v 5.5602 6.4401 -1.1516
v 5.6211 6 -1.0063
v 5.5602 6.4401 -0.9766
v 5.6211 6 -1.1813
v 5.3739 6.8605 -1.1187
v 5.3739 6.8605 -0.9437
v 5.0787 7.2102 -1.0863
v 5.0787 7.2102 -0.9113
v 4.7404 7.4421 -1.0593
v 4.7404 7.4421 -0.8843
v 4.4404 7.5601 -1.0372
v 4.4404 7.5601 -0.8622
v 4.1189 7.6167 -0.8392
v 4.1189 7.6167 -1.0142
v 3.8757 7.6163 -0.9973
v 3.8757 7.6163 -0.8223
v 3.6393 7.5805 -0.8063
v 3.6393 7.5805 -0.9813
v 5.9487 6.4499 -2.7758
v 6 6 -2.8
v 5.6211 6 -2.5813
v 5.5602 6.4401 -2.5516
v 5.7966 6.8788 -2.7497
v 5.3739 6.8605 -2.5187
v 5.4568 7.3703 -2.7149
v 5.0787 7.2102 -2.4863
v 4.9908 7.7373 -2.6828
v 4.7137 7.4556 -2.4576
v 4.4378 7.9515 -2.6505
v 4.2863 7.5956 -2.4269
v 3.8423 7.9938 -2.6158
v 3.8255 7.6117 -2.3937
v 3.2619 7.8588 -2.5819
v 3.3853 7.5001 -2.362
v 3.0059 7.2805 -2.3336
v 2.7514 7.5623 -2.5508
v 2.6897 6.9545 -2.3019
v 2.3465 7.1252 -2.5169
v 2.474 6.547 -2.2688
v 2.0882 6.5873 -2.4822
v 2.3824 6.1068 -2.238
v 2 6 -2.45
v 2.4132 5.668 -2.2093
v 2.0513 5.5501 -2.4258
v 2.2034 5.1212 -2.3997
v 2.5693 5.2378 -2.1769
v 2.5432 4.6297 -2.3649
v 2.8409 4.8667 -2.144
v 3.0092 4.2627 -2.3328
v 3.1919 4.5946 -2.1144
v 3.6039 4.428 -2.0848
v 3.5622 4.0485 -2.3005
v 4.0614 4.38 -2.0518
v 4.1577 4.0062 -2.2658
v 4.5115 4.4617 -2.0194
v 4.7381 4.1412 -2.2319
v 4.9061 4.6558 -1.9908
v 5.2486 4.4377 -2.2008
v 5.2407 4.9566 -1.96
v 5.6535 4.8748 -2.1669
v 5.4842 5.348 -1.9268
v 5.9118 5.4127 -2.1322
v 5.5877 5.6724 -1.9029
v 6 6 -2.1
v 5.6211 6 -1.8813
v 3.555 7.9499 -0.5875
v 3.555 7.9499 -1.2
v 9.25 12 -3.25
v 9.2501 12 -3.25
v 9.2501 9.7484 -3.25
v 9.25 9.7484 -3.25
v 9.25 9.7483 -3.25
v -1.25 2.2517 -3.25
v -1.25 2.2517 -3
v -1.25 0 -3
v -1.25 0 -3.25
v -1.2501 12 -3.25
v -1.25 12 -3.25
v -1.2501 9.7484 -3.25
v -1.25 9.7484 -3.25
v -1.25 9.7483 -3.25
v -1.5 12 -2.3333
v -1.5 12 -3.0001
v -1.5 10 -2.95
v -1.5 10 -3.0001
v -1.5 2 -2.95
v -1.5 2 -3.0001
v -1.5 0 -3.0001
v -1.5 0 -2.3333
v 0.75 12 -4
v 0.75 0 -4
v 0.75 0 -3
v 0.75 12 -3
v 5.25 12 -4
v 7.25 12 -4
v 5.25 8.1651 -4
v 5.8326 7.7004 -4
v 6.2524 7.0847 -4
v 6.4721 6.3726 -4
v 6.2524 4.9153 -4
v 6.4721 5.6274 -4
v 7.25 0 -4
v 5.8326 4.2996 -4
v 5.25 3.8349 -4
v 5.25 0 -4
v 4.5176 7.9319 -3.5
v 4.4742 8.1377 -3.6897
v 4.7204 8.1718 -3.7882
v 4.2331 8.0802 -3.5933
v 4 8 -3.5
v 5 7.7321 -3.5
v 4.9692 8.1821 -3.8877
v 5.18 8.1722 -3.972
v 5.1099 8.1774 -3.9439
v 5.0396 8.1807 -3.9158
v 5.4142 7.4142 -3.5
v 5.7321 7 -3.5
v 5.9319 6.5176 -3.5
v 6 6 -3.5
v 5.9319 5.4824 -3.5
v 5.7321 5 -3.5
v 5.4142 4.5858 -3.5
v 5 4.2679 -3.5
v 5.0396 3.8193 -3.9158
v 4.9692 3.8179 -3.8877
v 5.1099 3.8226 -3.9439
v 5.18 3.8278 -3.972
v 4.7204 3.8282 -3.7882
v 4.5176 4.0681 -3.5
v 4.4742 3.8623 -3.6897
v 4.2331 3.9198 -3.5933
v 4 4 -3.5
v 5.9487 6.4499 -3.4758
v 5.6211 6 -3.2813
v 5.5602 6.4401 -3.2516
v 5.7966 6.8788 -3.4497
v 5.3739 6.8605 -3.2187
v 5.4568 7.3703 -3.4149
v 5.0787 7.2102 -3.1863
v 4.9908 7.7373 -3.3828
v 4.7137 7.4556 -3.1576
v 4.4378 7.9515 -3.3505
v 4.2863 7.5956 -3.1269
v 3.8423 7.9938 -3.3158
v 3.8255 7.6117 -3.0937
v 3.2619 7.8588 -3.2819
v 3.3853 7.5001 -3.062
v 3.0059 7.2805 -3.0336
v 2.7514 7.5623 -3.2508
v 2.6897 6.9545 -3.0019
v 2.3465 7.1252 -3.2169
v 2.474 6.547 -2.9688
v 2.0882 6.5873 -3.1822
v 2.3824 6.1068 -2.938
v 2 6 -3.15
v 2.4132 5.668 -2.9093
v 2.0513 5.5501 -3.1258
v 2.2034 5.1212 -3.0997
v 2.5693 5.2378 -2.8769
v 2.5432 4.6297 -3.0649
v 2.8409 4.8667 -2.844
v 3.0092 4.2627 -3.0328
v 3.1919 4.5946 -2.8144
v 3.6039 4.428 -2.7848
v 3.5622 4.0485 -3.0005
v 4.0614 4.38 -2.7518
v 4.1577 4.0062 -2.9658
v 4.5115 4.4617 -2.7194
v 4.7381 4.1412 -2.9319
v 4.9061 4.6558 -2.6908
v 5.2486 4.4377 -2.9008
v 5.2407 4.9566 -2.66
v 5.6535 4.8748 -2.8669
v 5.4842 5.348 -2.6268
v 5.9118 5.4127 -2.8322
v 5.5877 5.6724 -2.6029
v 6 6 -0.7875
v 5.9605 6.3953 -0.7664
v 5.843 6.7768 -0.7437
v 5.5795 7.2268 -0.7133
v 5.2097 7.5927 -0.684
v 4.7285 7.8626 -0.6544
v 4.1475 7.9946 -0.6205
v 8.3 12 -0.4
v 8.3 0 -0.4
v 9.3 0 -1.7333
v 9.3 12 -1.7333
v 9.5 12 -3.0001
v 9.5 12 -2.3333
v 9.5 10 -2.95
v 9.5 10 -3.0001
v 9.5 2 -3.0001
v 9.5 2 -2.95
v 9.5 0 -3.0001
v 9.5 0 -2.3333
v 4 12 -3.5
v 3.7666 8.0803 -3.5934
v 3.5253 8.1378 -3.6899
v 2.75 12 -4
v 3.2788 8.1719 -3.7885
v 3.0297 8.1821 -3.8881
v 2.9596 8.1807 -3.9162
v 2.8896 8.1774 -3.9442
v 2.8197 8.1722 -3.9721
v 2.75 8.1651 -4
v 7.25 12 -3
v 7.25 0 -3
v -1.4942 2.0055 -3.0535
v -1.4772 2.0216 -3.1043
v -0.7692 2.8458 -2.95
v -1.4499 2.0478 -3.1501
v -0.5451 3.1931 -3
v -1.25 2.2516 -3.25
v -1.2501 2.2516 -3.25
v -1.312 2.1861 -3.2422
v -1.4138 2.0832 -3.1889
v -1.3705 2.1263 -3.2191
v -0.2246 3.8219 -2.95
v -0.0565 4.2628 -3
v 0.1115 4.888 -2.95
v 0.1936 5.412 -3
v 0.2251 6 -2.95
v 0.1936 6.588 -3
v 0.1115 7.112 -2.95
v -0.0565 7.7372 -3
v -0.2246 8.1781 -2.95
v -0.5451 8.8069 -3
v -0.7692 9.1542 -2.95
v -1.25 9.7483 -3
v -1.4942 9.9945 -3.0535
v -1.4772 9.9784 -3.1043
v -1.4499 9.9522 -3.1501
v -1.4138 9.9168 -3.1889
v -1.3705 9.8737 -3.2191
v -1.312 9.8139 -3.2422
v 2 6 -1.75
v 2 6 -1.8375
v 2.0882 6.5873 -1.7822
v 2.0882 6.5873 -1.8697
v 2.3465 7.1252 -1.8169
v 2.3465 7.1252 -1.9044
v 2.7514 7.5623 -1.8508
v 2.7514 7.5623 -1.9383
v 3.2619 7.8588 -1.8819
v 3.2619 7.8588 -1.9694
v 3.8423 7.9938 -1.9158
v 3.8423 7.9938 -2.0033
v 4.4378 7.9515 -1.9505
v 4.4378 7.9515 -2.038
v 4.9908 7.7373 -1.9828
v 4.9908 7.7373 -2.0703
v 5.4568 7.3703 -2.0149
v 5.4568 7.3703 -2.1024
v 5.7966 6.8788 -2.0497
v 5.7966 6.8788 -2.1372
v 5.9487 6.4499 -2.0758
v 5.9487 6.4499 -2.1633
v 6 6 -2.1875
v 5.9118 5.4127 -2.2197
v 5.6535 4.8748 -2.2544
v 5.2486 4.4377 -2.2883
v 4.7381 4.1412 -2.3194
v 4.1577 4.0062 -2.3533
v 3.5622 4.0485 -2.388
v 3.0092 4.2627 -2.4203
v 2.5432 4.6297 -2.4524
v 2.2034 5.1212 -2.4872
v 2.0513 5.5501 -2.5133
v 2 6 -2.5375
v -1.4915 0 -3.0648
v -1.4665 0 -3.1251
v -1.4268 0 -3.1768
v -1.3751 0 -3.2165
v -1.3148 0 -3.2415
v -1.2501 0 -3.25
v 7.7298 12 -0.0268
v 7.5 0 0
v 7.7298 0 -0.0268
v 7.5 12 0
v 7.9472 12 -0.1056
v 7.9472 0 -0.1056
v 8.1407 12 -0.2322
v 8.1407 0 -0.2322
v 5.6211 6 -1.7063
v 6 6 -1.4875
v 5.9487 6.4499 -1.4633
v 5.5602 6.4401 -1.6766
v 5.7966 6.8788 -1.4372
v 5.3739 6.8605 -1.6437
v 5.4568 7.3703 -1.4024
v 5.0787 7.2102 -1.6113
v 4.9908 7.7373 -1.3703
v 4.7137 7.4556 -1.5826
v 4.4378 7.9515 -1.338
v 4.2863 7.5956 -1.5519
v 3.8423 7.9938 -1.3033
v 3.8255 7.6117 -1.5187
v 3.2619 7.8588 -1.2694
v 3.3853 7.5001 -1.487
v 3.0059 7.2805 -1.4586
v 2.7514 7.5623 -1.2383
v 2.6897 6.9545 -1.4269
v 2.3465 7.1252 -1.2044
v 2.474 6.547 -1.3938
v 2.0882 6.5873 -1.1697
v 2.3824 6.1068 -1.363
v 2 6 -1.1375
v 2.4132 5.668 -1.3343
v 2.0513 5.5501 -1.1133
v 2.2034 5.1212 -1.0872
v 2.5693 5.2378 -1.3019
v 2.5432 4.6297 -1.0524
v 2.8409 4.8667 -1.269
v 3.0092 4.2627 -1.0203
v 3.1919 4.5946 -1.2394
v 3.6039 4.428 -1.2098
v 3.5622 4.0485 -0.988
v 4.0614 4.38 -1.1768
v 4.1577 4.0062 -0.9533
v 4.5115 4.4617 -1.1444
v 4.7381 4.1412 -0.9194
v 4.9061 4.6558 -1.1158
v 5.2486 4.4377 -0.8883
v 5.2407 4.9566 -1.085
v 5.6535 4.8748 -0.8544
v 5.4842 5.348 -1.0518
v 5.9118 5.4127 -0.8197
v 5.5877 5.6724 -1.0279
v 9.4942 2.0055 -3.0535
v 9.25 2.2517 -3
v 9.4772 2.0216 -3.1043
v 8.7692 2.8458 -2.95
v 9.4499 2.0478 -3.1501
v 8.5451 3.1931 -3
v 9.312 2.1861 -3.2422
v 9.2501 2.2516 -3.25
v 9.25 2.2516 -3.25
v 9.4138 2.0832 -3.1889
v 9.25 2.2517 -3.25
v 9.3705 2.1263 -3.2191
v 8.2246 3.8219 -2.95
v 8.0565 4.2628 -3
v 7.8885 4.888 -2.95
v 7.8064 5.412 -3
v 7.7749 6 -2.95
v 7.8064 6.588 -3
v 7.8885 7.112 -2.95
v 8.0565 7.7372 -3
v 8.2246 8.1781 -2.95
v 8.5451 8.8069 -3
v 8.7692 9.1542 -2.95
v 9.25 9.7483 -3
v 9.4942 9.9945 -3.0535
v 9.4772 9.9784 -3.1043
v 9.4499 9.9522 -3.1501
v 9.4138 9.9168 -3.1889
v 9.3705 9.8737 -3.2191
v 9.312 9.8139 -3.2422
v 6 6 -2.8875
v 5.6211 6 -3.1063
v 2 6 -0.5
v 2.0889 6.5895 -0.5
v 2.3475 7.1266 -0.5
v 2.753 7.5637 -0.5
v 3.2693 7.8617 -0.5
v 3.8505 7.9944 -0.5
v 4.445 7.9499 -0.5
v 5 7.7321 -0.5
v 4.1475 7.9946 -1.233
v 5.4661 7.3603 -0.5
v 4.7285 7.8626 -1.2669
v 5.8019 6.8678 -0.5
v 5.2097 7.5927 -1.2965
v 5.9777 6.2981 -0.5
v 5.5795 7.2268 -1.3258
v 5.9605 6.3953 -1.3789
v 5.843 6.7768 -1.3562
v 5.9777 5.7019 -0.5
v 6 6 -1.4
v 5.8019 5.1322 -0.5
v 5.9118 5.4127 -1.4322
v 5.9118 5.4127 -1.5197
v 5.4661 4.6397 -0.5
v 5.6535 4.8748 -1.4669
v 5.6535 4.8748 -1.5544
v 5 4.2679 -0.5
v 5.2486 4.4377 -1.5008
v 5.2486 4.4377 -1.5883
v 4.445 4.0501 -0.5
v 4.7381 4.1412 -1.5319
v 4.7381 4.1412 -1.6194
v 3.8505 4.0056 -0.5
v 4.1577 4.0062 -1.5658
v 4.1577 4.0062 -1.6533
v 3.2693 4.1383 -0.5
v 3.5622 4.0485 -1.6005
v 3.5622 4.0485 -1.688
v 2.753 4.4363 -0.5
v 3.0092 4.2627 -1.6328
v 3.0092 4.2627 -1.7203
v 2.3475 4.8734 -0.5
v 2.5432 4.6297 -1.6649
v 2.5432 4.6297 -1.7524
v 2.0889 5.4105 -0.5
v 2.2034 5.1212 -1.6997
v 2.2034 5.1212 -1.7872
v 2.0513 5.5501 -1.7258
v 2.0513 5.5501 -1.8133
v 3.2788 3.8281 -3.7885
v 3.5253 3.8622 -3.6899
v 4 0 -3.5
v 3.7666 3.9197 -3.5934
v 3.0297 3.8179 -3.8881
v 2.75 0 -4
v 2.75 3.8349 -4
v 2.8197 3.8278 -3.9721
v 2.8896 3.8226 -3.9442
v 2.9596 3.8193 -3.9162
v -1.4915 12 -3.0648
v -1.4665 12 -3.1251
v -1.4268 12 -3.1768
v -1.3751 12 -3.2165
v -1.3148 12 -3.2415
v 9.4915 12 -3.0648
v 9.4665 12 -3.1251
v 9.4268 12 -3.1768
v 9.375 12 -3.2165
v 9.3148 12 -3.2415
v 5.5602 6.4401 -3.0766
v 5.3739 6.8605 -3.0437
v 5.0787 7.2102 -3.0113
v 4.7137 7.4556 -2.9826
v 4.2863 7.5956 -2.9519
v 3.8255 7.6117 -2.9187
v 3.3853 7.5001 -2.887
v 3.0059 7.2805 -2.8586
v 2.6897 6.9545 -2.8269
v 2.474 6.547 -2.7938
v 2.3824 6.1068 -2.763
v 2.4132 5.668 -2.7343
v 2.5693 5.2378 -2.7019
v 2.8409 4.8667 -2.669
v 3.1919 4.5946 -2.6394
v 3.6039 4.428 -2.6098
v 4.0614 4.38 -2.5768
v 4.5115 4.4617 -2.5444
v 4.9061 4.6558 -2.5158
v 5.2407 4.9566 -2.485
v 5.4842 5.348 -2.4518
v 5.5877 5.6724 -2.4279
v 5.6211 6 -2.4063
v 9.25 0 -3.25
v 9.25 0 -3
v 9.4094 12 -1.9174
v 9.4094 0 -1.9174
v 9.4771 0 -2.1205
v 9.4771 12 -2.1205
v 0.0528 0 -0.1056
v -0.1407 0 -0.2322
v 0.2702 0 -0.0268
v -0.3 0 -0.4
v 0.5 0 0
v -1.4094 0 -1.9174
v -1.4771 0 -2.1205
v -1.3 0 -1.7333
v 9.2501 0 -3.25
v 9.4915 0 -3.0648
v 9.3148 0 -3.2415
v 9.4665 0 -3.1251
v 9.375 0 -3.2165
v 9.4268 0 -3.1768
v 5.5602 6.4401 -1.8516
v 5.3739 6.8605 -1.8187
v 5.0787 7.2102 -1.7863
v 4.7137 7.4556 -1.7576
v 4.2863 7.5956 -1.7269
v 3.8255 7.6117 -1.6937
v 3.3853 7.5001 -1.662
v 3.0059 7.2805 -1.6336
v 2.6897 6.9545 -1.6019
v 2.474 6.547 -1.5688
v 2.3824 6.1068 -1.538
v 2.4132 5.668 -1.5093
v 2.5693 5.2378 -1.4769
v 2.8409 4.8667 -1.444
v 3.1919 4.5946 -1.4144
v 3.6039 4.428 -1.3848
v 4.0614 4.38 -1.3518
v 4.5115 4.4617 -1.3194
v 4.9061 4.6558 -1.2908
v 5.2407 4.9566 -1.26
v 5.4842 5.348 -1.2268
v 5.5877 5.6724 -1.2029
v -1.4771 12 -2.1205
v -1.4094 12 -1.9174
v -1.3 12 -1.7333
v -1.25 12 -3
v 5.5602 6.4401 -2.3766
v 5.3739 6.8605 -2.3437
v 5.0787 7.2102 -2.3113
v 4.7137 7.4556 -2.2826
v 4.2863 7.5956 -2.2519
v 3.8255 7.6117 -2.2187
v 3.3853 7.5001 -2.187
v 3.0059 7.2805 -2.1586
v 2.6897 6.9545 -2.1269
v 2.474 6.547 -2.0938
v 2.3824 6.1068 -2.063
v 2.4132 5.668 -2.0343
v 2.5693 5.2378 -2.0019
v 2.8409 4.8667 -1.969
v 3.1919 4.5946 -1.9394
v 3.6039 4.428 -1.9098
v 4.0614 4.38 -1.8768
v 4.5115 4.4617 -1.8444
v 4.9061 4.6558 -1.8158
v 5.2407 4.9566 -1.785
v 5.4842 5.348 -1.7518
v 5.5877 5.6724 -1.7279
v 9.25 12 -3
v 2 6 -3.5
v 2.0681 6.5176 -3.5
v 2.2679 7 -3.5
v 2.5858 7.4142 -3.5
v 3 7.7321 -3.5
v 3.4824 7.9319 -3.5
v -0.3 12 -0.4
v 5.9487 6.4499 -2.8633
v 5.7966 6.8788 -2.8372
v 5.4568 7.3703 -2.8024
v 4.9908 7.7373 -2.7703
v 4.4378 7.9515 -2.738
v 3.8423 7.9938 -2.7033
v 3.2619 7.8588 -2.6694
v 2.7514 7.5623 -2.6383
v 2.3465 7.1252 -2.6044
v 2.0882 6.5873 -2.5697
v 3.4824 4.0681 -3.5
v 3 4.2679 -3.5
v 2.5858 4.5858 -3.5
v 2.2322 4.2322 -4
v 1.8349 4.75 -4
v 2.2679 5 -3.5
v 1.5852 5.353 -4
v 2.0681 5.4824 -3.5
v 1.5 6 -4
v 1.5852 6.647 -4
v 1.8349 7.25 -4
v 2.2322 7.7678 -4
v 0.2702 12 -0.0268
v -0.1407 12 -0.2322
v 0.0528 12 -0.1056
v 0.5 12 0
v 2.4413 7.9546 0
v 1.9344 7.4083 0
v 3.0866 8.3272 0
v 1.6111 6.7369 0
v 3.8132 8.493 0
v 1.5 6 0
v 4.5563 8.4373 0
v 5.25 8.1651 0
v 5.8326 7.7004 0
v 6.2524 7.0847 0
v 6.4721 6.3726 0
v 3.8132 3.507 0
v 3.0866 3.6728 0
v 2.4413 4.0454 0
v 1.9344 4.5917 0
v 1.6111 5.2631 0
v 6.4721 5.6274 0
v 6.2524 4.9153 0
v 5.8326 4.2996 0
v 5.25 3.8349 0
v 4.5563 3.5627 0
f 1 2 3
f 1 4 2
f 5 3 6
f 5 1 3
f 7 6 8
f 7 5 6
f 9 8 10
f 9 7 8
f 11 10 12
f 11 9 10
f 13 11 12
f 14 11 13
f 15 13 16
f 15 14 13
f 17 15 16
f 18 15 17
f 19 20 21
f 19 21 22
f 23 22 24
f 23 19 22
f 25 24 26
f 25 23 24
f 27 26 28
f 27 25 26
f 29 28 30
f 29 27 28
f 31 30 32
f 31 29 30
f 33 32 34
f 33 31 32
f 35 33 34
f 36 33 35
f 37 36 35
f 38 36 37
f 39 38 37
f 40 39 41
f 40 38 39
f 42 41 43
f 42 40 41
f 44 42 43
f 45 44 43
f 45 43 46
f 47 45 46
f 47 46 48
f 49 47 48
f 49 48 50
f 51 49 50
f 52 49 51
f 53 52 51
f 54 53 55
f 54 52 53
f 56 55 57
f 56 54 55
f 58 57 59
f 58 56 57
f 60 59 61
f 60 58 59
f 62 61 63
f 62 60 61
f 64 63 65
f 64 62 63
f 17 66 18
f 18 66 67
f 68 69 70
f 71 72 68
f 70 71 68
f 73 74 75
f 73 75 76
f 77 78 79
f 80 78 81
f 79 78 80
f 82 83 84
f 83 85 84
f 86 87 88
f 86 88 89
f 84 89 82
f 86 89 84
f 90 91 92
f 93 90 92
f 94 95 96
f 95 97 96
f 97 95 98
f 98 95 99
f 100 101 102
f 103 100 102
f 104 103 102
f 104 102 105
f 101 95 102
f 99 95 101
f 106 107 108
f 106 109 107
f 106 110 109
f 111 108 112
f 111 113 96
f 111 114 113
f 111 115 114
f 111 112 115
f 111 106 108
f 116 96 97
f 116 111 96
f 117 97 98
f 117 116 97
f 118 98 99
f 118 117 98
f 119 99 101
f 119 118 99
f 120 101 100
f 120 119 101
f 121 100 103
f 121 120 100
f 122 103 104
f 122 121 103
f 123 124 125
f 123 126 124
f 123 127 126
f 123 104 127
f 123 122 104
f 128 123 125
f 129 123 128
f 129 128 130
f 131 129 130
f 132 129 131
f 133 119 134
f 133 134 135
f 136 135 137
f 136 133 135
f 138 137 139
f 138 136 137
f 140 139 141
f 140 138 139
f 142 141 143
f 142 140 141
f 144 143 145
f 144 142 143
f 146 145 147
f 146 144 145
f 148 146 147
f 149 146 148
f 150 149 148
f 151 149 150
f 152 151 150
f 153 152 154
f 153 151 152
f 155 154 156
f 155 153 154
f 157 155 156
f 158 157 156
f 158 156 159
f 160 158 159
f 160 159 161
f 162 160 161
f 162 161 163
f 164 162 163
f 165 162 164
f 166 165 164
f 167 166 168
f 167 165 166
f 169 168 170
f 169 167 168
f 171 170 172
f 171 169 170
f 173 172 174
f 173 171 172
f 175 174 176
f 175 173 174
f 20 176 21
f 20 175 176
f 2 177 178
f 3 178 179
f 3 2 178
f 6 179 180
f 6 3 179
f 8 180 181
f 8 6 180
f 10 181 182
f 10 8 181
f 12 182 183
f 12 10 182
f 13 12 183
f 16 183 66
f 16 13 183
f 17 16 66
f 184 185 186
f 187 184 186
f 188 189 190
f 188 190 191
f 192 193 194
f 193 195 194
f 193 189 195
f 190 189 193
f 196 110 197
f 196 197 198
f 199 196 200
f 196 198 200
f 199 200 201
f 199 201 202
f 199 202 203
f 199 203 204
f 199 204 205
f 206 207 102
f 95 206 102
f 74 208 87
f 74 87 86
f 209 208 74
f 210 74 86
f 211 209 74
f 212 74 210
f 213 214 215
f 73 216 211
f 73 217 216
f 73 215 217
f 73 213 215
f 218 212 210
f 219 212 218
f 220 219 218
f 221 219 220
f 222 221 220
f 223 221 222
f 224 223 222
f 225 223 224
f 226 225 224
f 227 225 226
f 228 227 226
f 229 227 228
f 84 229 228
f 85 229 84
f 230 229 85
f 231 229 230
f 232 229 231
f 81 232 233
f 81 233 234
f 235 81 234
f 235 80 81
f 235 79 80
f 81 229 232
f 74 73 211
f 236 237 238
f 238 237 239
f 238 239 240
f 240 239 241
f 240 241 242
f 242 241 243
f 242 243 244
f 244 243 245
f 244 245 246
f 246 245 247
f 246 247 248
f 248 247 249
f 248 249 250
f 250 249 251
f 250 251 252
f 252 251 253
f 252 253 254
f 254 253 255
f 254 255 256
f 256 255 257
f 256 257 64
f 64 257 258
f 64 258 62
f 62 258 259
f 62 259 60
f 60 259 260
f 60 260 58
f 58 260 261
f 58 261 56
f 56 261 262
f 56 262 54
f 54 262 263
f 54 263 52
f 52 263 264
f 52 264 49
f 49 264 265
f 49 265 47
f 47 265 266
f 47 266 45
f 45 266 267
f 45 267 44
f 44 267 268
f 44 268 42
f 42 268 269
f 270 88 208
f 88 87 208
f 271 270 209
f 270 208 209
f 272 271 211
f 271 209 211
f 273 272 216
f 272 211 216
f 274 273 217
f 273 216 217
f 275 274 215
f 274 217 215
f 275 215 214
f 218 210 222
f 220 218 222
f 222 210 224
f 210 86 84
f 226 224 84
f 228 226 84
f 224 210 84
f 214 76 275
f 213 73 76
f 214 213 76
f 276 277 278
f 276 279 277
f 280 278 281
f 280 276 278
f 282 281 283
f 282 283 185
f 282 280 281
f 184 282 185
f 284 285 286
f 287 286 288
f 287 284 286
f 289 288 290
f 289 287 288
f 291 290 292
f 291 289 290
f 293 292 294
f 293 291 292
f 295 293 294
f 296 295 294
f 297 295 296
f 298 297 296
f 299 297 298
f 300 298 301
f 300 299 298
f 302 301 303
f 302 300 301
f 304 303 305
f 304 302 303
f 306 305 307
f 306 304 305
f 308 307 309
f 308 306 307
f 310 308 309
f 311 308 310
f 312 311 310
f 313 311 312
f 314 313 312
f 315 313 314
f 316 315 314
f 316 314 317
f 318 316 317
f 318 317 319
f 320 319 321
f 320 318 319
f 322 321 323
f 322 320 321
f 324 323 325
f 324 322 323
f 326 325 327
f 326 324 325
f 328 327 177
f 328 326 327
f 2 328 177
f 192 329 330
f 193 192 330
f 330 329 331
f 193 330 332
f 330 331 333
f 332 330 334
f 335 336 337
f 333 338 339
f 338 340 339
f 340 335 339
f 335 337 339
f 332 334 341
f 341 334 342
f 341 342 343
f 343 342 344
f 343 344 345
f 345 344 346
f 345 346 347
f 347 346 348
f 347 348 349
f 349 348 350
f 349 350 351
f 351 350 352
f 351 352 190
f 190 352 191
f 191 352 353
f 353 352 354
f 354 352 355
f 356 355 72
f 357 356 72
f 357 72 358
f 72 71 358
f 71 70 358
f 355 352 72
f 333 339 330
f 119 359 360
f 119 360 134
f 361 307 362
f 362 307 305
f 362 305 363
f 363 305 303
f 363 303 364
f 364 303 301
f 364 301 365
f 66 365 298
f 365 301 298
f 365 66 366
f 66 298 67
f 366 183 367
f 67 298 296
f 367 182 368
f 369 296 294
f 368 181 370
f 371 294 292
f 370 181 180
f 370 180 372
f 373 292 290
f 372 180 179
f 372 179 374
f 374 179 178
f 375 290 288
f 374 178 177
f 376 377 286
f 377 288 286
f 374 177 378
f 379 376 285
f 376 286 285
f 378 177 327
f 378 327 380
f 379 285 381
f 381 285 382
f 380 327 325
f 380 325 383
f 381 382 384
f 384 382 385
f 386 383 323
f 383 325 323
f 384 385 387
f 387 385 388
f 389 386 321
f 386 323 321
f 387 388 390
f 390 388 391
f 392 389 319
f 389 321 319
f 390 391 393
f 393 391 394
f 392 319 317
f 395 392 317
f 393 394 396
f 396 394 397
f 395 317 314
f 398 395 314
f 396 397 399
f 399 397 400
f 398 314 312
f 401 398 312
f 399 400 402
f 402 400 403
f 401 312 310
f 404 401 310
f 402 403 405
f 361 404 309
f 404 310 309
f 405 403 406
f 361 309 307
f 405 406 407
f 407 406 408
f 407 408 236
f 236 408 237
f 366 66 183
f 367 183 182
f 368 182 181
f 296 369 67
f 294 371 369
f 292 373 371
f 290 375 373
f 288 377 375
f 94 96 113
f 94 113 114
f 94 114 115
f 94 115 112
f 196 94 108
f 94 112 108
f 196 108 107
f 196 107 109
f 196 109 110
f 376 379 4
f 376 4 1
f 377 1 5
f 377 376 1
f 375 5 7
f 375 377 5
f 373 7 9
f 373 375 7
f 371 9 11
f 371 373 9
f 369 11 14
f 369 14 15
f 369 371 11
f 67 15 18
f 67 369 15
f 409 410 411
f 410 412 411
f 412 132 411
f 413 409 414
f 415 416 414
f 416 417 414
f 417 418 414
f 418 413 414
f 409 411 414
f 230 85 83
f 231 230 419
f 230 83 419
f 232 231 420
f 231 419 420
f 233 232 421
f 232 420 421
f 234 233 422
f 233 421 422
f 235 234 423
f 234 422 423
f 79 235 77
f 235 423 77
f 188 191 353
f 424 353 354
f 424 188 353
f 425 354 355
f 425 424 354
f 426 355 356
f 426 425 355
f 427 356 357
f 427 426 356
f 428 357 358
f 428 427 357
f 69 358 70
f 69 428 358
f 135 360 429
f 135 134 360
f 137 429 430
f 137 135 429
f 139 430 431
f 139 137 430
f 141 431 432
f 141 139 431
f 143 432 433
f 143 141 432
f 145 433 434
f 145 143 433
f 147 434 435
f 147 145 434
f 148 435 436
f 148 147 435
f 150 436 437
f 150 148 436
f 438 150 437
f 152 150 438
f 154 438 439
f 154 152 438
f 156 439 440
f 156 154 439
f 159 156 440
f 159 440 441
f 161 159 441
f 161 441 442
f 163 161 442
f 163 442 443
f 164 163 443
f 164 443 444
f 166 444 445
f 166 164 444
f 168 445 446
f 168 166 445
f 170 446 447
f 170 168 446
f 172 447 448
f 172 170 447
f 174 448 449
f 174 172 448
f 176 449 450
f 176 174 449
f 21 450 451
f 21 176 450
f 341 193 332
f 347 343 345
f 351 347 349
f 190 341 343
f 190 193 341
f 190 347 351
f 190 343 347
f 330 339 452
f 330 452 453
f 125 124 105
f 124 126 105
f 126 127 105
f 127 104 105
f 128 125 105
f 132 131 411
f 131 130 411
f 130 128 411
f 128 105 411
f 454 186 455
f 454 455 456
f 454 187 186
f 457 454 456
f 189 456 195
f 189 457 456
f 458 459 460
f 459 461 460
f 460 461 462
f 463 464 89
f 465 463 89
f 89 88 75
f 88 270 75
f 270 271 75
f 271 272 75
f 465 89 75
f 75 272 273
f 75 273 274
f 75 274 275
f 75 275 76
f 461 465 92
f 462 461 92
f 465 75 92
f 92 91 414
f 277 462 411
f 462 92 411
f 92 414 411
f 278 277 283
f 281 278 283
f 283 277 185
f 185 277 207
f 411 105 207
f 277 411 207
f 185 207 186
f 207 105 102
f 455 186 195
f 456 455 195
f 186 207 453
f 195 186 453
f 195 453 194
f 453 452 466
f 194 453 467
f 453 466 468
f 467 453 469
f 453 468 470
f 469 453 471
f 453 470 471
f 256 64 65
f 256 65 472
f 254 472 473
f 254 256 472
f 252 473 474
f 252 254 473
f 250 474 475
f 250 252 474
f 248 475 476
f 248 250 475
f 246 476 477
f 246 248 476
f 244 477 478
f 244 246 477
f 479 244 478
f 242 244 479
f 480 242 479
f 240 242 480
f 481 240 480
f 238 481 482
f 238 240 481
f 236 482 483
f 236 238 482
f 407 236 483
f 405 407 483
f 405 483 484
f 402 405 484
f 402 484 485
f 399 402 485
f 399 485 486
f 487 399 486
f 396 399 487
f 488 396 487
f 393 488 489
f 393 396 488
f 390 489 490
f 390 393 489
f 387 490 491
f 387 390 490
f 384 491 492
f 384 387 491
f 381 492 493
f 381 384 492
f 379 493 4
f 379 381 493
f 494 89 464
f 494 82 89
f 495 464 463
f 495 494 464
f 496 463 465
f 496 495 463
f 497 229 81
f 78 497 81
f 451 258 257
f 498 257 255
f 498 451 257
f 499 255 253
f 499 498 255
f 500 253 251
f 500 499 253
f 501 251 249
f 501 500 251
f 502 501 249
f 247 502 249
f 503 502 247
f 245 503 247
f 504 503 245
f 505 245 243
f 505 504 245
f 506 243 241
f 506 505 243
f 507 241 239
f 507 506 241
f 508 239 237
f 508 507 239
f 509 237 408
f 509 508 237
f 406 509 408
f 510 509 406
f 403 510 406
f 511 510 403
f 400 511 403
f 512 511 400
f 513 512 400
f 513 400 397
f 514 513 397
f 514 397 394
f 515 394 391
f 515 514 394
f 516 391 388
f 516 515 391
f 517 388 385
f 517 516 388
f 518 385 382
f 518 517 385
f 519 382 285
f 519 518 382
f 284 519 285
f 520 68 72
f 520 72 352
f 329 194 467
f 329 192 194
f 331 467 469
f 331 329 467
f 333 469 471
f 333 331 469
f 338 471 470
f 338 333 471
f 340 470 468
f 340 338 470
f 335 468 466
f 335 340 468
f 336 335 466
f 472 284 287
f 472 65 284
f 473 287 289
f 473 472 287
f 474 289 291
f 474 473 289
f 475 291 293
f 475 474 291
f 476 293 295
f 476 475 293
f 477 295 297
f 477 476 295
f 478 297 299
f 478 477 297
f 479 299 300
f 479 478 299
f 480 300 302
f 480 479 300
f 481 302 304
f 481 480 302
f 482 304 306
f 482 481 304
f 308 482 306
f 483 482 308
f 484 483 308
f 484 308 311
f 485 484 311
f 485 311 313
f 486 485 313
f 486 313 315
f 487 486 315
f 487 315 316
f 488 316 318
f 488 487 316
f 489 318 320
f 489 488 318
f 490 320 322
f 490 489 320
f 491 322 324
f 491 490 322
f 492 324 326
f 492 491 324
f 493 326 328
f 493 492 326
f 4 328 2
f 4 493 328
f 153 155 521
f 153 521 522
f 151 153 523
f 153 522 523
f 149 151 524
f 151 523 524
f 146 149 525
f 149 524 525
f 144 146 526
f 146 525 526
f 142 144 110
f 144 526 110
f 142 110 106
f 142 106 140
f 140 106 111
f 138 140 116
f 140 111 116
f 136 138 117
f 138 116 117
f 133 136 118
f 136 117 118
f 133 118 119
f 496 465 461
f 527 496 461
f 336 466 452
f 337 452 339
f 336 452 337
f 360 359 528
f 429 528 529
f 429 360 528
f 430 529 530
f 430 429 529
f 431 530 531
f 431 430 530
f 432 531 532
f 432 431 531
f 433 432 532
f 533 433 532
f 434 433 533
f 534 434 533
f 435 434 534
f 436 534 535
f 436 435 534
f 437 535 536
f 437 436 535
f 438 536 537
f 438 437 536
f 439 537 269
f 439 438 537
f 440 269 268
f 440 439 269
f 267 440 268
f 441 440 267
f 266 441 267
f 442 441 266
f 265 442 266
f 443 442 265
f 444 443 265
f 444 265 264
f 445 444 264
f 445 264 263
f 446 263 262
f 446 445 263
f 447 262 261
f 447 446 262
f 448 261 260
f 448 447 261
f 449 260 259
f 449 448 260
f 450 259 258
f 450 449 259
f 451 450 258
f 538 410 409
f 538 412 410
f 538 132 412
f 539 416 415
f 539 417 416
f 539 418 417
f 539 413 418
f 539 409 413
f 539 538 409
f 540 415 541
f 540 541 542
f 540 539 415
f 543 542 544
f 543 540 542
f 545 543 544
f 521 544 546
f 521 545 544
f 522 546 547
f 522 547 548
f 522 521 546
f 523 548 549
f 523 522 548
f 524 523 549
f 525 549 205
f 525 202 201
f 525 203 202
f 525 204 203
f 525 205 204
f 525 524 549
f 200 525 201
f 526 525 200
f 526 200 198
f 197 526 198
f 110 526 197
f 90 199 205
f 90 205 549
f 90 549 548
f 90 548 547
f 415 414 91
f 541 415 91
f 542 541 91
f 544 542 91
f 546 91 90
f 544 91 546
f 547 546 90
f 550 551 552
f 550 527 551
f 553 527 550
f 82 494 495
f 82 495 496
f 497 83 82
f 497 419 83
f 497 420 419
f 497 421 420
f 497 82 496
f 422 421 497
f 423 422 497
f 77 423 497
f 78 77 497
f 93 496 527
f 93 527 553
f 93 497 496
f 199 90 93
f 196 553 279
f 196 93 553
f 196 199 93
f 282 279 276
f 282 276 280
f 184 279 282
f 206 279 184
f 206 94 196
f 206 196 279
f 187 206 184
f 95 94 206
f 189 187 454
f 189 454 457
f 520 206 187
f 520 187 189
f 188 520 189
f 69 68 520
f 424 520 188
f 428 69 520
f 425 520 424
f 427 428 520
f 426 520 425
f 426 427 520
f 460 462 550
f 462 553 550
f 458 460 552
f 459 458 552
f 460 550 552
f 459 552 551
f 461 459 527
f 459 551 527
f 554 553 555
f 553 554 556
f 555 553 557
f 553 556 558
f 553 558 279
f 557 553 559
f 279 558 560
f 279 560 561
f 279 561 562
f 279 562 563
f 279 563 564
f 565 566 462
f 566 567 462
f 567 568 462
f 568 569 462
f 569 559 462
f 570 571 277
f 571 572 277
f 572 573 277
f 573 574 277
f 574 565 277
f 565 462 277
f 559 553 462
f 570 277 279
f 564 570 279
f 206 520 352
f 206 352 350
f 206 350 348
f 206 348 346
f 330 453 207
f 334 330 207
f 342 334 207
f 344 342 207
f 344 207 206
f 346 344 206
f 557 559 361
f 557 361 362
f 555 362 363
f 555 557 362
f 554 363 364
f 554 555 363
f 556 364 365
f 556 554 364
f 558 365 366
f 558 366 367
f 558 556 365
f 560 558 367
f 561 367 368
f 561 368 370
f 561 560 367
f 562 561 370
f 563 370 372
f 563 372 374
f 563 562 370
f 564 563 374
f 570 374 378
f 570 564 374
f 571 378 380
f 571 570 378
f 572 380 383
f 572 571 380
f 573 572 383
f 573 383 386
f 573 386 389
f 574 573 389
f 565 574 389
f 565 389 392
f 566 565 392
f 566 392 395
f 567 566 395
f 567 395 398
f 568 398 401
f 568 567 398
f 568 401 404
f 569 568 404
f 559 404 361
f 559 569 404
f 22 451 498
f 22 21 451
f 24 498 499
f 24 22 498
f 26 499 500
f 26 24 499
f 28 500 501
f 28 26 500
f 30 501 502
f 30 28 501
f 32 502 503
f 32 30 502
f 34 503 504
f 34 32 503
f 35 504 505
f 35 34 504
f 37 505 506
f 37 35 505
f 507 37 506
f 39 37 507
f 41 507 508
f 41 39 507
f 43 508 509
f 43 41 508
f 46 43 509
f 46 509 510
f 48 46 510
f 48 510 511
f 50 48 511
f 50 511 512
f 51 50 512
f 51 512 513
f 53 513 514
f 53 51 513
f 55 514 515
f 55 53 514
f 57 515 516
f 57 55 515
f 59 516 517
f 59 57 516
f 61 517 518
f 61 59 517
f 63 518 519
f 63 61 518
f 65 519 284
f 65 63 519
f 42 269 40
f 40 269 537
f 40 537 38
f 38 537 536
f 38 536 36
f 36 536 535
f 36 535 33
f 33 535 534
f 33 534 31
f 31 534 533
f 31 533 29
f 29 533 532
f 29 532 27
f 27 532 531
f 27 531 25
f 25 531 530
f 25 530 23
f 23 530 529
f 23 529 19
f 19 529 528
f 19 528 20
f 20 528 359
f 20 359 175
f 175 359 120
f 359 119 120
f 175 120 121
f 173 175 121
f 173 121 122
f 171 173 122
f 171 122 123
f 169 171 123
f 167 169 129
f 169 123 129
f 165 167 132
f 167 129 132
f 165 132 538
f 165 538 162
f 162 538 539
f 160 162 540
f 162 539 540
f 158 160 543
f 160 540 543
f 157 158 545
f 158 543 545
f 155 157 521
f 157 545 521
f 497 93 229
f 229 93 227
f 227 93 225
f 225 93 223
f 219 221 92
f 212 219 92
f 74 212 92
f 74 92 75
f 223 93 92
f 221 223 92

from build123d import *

# Parameters (mm, degrees)
BOSS_EXTRUDE1_DEPTH = 12
FILLET1_R           = 1
SKETCH4_R           = 2
CUT_EXTRUDE1_DEPTH  = 16.81929202
THREAD1_PITCH       = 0.7
CHAMFER2_SIZE       = 0.5
CHAMFER4_SIZE       = 0.5
CUT_EXTRUDE2_DEPTH  = 0.3
FILLET4_R           = 0.25


with BuildPart() as part:
    # Sketch2 → Boss-Extrude1 (new body)
    with BuildSketch(Plane(origin=(0, 0, 0), x_dir=(1, 0, 0), z_dir=(0, 1, 0))):
        Polygon((0, 0), (8, 0), (9.5, 2), (9.5, 3.25), (9.25, 3.25), (9.25, 3), (7.25, 3), (7.25, 4), (5.25, 4), (4, 3.5), (2.75, 4), (0.75, 4), (0.75, 3), (-1.25, 3), (-1.25, 3.25), (-1.5, 3.25), (-1.5, 2), align=None)
    extrude(amount=BOSS_EXTRUDE1_DEPTH)

    # Fillet1
    fillet1_edges = [part.edges().sort_by_distance(p)[0] for p in [
        (-1.5, 6, -2),
        (9.5, 6, -2),
        (8, 6, 0),
        (0, 6, 0),
    ]]
    fillet(fillet1_edges, radius=FILLET1_R)

    # Sketch4 → Cut-Extrude1 (cut, through all)
    with BuildSketch(Plane(origin=(0, 0, -4), x_dir=(-1, 0, 0), z_dir=(0, 0, -1))):
        with Locations((-4, 6)):
            Circle(SKETCH4_R)
    extrude(amount=-CUT_EXTRUDE1_DEPTH, mode=Mode.SUBTRACT)

    # Thread1: arcs per turn and ends read off the stored shape
    # Thread1: the profile of Thread Profile1 profile screwed along a right-hand helix through 3.285711 turns, 6 arcs to a turn; built about Z, then put on its axis
    thread1_z = Axis((0, 0, 0), (0, 0, 1))
    thread1_corners = [(2.0003, 0, -0.000173205), (2.0003, 0, 0.612673203), (1.621113887, 0, 0.393749999), (1.621113887, 0, 0.218749999)]
    with BuildLine(mode=Mode.PRIVATE) as thread1_profile:
        Line(thread1_corners[0], thread1_corners[1])
        Line(thread1_corners[1], thread1_corners[2])
        Line(thread1_corners[2], thread1_corners[3])
        Line(thread1_corners[3], thread1_corners[0])
    thread1_cap = Face(thread1_profile.wire())
    thread1_turn_angles = [0, 30, 60, 90, 120, 150, 180, 210, 240, 270, 300, 330, 360]
    thread1_turn_weights = [1, 0.8660254037844387, 1, 0.8660254037844387, 1, 0.8660254037844387, 1, 0.8660254037844387, 1, 0.8660254037844387, 1, 0.8660254037844387, 1]
    thread1_turn_rails = [Edge.make_bspline([Vector(p[0], p[1], 0).rotate(thread1_z, thread1_turn_angles[k]) / thread1_turn_weights[k] + Vector(0, 0, p[2] + THREAD1_PITCH * thread1_turn_angles[k] / 360) for k in range(13)], [0, 0, 0, 1, 1, 2, 2, 3, 3, 4, 4, 5, 5, 6, 6, 6], 2, thread1_turn_weights) for p in thread1_corners]
    thread1_turn_sides = [Face.make_surface_from_curves(thread1_turn_rails[p[0]], thread1_turn_rails[p[1]]) for p in [(0, 1), (1, 2), (2, 3), (3, 0)]]
    thread1_last_angles = [1080, 1110, 1140, 1161.428, 1182.856]
    thread1_last_weights = [1, 0.8660254037844387, 1, 0.9308773922572046, 1]
    thread1_last_rails = [Edge.make_bspline([Vector(p[0], p[1], 0).rotate(thread1_z, thread1_last_angles[k]) / thread1_last_weights[k] + Vector(0, 0, p[2] + THREAD1_PITCH * thread1_last_angles[k] / 360) for k in range(5)], [0, 0, 0, 1, 1, 2, 2, 2], 2, thread1_last_weights) for p in thread1_corners]
    thread1_last_sides = [Face.make_surface_from_curves(thread1_last_rails[p[0]], thread1_last_rails[p[1]]) for p in [(0, 1), (1, 2), (2, 3), (3, 0)]]
    thread1 = Plane(origin=(4, 6, -3.5), x_dir=(1, 0, 0), z_dir=(0, 0, 1)) * Solid(Shell([*[p.moved(Location((0, 0, THREAD1_PITCH * i))) for i in range(3) for p in thread1_turn_sides], *thread1_last_sides, thread1_cap, thread1_cap.rotate(thread1_z, 1182.856).moved(Location((0, 0, THREAD1_PITCH * 1182.856 / 360)))]))
    add(thread1)

    # Chamfer2
    # the kernel refuses this chamfer: 0.5 mm, written as the material it takes off along each edge
    with BuildSketch(Plane(origin=(4, 6, -4), x_dir=(-0.4063033524336664, 0.9137382479688392, 0), z_dir=(-0.9137382479688392, -0.4063033524336664, 0))) as chamfer2_piece_1:
        Polygon((2 + CHAMFER2_SIZE, 0), (2, -CHAMFER2_SIZE), (2, 0), align=None)
    revolve(axis=Axis((4, 6, -4), (0, 0, -1)), revolution_arc=227.945655457, mode=Mode.SUBTRACT)
    with BuildSketch(Plane(origin=(4, 6, -4), x_dir=(-1, 0, 0), z_dir=(0, -1, 0))) as chamfer2_piece_2:
        Polygon((2 + CHAMFER2_SIZE, 0), (2, -CHAMFER2_SIZE), (2, 0), align=None)
    revolve(axis=Axis((4, 6, -4), (0, 0, -1)), revolution_arc=113.948286938, mode=Mode.SUBTRACT)
    with BuildSketch(Plane(origin=(4, 6, -4), x_dir=(0.4059119450129516, -0.9139121910204517, 0), z_dir=(0.9139121910204517, 0.4059119450129516, 0))) as chamfer2_piece_3:
        Polygon((2 + CHAMFER2_SIZE, 0), (2, -CHAMFER2_SIZE), (2, 0), align=None)
    revolve(axis=Axis((4, 6, -4), (0, 0, -1)), revolution_arc=113.948286938, mode=Mode.SUBTRACT)

    # Chamfer4
    chamfer4_edges = [part.edges().sort_by_distance(p)[0] for p in [
        (6, 6, 0),
    ]]
    chamfer(chamfer4_edges, length=CHAMFER4_SIZE)

    # Sketch8 → Cut-Extrude2 (cut)
    with BuildSketch(Plane(origin=(0, 0, -3.25), x_dir=(-1, 0, 0), z_dir=(0, 0, -1))):
        with BuildLine():
            Line((-9.5, 10), (-9.5, 2))
            ThreePointArc((-9.5, 2), (-7.774917218, 6), (-9.5, 10))
        make_face()
        with BuildLine():
            Line((1.5, 10), (1.5, 2))
            ThreePointArc((1.5, 2), (-0.225082782, 6), (1.5, 10))
        make_face()
    extrude(amount=-CUT_EXTRUDE2_DEPTH, mode=Mode.SUBTRACT)

    # Fillet4
    fillet4_edges = [part.edges().sort_by_distance(p)[0] for p in [
        (-1.5, 11, -3.25),
        (-1.5, 1, -3.25),
        (9.5, 11, -3.25),
        (9.5, 1, -3.25),
    ]]
    fillet(fillet4_edges, radius=FILLET4_R - 0.0001)  # a hair under: the kernel refuses the full size


solid = part.part
